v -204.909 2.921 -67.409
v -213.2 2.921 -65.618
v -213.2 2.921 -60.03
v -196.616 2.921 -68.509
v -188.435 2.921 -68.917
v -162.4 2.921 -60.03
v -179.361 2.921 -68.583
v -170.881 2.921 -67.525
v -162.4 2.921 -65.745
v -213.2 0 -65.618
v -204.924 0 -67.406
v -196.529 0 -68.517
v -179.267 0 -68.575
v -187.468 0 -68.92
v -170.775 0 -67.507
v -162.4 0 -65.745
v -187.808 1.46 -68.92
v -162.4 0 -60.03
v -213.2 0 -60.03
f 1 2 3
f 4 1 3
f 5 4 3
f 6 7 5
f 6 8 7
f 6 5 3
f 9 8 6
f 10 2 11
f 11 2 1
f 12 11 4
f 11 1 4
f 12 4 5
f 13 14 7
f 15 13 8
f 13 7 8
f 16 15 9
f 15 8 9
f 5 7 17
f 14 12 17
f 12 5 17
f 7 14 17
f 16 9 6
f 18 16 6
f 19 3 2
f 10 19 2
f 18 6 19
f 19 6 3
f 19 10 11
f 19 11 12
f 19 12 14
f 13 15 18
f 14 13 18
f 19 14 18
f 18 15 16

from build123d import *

# Parameters (mm, degrees)
SKETCH1_W           = 304.8
SKETCH1_H           = 76.2
BOSS_EXTRUDE1_DEPTH = 3.175
CUT_EXTRUDE3_DEPTH  = 0.254
CUT_EXTRUDE5_DEPTH  = 0.254
SKETCH3_2_OUTSIDE_W = 369.64
SKETCH3_2_OUTSIDE_H = 141.04
CUT_EXTRUDE8_DEPTH  = 315.196691105


with BuildPart() as part:
    # Sketch1 → Boss-Extrude1 (new body)
    with BuildSketch(Plane(origin=(0, 0, 0), x_dir=(1, 0, 0), z_dir=(0, 1, 0))):
        with Locations((-152.4, 38.1)):
            Rectangle(SKETCH1_W, SKETCH1_H)
    extrude(amount=BOSS_EXTRUDE1_DEPTH)

    # Sketch2 → Cut-Extrude3 (cut)
    with BuildSketch(Plane(origin=(0, 3.175, 0), x_dir=(1, 0, 0), z_dir=(0, 1, 0))):
        with BuildLine():
            Line((-304.8, 5.132354223), (-304.8, 0.390438323))
            add(Edge.make_bspline(
                [(-304.8, 0.390438323), (-303.821243343, 0.22923291), (-302.632591032, 0.100235841), (-301.136713645, 0)],
                knots=[0.767987957, 0.767987957, 0.767987957, 0.767987957, 1, 1, 1, 1], degree=3))
            Line((-301.136713645, 0), (-217.379871236, 0))
            add(Edge.make_bspline(
                [(-215.9, 0.210253502), (-216.602591478, 0.075926224), (-217.379871236, 0)],
                knots=[0.882956558, 0.882956558, 0.882956558, 1, 1, 1], degree=2))
            Line((-215.9, 0.210253502), (-215.9, 6.35))
            add(Edge.make_bspline(
                [(-304.8, 5.132354223), (-295.056068779, 7.913424716), (-284.63514545, 9.175759011), (-256.65451685, 7.910717471), (-231.983718042, 8.039058457), (-215.9, 6.35)],
                knots=[0.033341876, 0.033341876, 0.033341876, 0.033341876, 0.196819423, 0.285044024, 0.915587883, 0.915587883, 0.915587883, 0.915587883], degree=3))
        make_face()
        with BuildLine():
            Line((-304.748193138, 14.319973849), (-304.748193138, 9.578057948))
            add(Edge.make_bspline(
                [(-304.748193138, 9.578057948), (-303.76943648, 9.416852535), (-302.58078417, 9.287855466), (-301.084906782, 9.187619625)],
                knots=[0.767987957, 0.767987957, 0.767987957, 0.767987957, 1, 1, 1, 1], degree=3))
            Line((-301.084906782, 9.187619625), (-217.328064374, 9.187619625))
            add(Edge.make_bspline(
                [(-215.848193138, 9.397873128), (-216.550784616, 9.263545849), (-217.328064374, 9.187619625)],
                knots=[0.882956558, 0.882956558, 0.882956558, 1, 1, 1], degree=2))
            Line((-215.848193138, 9.397873128), (-215.848193138, 15.537619625))
            add(Edge.make_bspline(
                [(-304.748193138, 14.319973849), (-295.004261916, 17.101044341), (-284.583338588, 18.363378636), (-256.602709988, 17.098337097), (-231.93191118, 17.226678082), (-215.848193138, 15.537619625)],
                knots=[0.033341876, 0.033341876, 0.033341876, 0.033341876, 0.196819423, 0.285044024, 0.915587883, 0.915587883, 0.915587883, 0.915587883], degree=3))
        make_face()
        with BuildLine():
            Line((-304.77561062, 23.435546339), (-304.77561062, 18.693630439))
            add(Edge.make_bspline(
                [(-304.77561062, 18.693630439), (-303.796853962, 18.532425025), (-302.608201652, 18.403427957), (-301.112324264, 18.303192116)],
                knots=[0.767987957, 0.767987957, 0.767987957, 0.767987957, 1, 1, 1, 1], degree=3))
            Line((-301.112324264, 18.303192116), (-217.355481855, 18.303192116))
            add(Edge.make_bspline(
                [(-215.87561062, 18.513445618), (-216.578202097, 18.37911834), (-217.355481855, 18.303192116)],
                knots=[0.882956558, 0.882956558, 0.882956558, 1, 1, 1], degree=2))
            Line((-215.87561062, 18.513445618), (-215.87561062, 24.653192116))
            add(Edge.make_bspline(
                [(-304.77561062, 23.435546339), (-295.031679398, 26.216616832), (-284.61075607, 27.478951126), (-256.63012747, 26.213909587), (-231.959328661, 26.342250572), (-215.87561062, 24.653192116)],
                knots=[0.033341876, 0.033341876, 0.033341876, 0.033341876, 0.196819423, 0.285044024, 0.915587883, 0.915587883, 0.915587883, 0.915587883], degree=3))
        make_face()
        with BuildLine():
            Line((-304.723803757, 32.623165964), (-304.723803757, 27.881250064))
            add(Edge.make_bspline(
                [(-304.723803757, 27.881250064), (-303.7450471, 27.720044651), (-302.55639479, 27.591047582), (-301.060517402, 27.490811741)],
                knots=[0.767987957, 0.767987957, 0.767987957, 0.767987957, 1, 1, 1, 1], degree=3))
            Line((-301.060517402, 27.490811741), (-217.303674993, 27.490811741))
            add(Edge.make_bspline(
                [(-215.823803757, 27.701065244), (-216.526395235, 27.566737965), (-217.303674993, 27.490811741)],
                knots=[0.882956558, 0.882956558, 0.882956558, 1, 1, 1], degree=2))
            Line((-215.823803757, 27.701065244), (-215.823803757, 33.840811741))
            add(Edge.make_bspline(
                [(-304.723803757, 32.623165964), (-294.979872536, 35.404236457), (-284.558949208, 36.666570752), (-256.578320608, 35.401529213), (-231.907521799, 35.529870198), (-215.823803757, 33.840811741)],
                knots=[0.033341876, 0.033341876, 0.033341876, 0.033341876, 0.196819423, 0.285044024, 0.915587883, 0.915587883, 0.915587883, 0.915587883], degree=3))
        make_face()
        with BuildLine():
            Line((-304.692120731, 41.752034592), (-304.692120731, 37.010118692))
            add(Edge.make_bspline(
                [(-304.692120731, 37.010118692), (-303.713364073, 36.848913278), (-302.524711763, 36.71991621), (-301.028834375, 36.619680369)],
                knots=[0.767987957, 0.767987957, 0.767987957, 0.767987957, 1, 1, 1, 1], degree=3))
            Line((-301.028834375, 36.619680369), (-217.271991966, 36.619680369))
            add(Edge.make_bspline(
                [(-215.792120731, 36.829933871), (-216.494712209, 36.695606593), (-217.271991966, 36.619680369)],
                knots=[0.882956558, 0.882956558, 0.882956558, 1, 1, 1], degree=2))
            Line((-215.792120731, 36.829933871), (-215.792120731, 42.969680369))
            add(Edge.make_bspline(
                [(-304.692120731, 41.752034592), (-294.948189509, 44.533105085), (-284.527266181, 45.795439379), (-256.546637581, 44.53039784), (-231.875838773, 44.658738825), (-215.792120731, 42.969680369)],
                knots=[0.033341876, 0.033341876, 0.033341876, 0.033341876, 0.196819423, 0.285044024, 0.915587883, 0.915587883, 0.915587883, 0.915587883], degree=3))
        make_face()
        with BuildLine():
            Line((-304.640313869, 50.939654217), (-304.640313869, 46.197738317))
            add(Edge.make_bspline(
                [(-304.640313869, 46.197738317), (-303.661557211, 46.036532904), (-302.472904901, 45.907535835), (-300.977027513, 45.807299994)],
                knots=[0.767987957, 0.767987957, 0.767987957, 0.767987957, 1, 1, 1, 1], degree=3))
            Line((-300.977027513, 45.807299994), (-217.220185104, 45.807299994))
            add(Edge.make_bspline(
                [(-215.740313869, 46.017553497), (-216.442905346, 45.883226218), (-217.220185104, 45.807299994)],
                knots=[0.882956558, 0.882956558, 0.882956558, 1, 1, 1], degree=2))
            Line((-215.740313869, 46.017553497), (-215.740313869, 52.157299994))
            add(Edge.make_bspline(
                [(-304.640313869, 50.939654217), (-294.896382647, 53.72072471), (-284.475459319, 54.983059005), (-256.494830719, 53.718017466), (-231.82403191, 53.846358451), (-215.740313869, 52.157299994)],
                knots=[0.033341876, 0.033341876, 0.033341876, 0.033341876, 0.196819423, 0.285044024, 0.915587883, 0.915587883, 0.915587883, 0.915587883], degree=3))
        make_face()
        with BuildLine():
            Line((-304.66773135, 60.055226708), (-304.66773135, 55.313310807))
            add(Edge.make_bspline(
                [(-304.66773135, 55.313310807), (-303.688974693, 55.152105394), (-302.500322383, 55.023108326), (-301.004444995, 54.922872485)],
                knots=[0.767987957, 0.767987957, 0.767987957, 0.767987957, 1, 1, 1, 1], degree=3))
            Line((-301.004444995, 54.922872485), (-217.247602586, 54.922872485))
            add(Edge.make_bspline(
                [(-215.76773135, 55.133125987), (-216.470322828, 54.998798708), (-217.247602586, 54.922872485)],
                knots=[0.882956558, 0.882956558, 0.882956558, 1, 1, 1], degree=2))
            Line((-215.76773135, 55.133125987), (-215.76773135, 61.272872485))
            add(Edge.make_bspline(
                [(-304.66773135, 60.055226708), (-294.923800129, 62.836297201), (-284.502876801, 64.098631495), (-256.522248201, 62.833589956), (-231.851449392, 62.961930941), (-215.76773135, 61.272872485)],
                knots=[0.033341876, 0.033341876, 0.033341876, 0.033341876, 0.196819423, 0.285044024, 0.915587883, 0.915587883, 0.915587883, 0.915587883], degree=3))
        make_face()
        with BuildLine():
            Line((-304.615924488, 69.242846333), (-304.615924488, 64.500930433))
            add(Edge.make_bspline(
                [(-304.615924488, 64.500930433), (-303.637167831, 64.33972502), (-302.448515521, 64.210727951), (-300.952638133, 64.11049211)],
                knots=[0.767987957, 0.767987957, 0.767987957, 0.767987957, 1, 1, 1, 1], degree=3))
            Line((-300.952638133, 64.11049211), (-217.195795724, 64.11049211))
            add(Edge.make_bspline(
                [(-215.715924488, 64.320745612), (-216.418515966, 64.186418334), (-217.195795724, 64.11049211)],
                knots=[0.882956558, 0.882956558, 0.882956558, 1, 1, 1], degree=2))
            Line((-215.715924488, 64.320745612), (-215.715924488, 70.46049211))
            add(Edge.make_bspline(
                [(-304.615924488, 69.242846333), (-294.871993267, 72.023916826), (-284.451069938, 73.286251121), (-256.470441339, 72.021209581), (-231.79964253, 72.149550567), (-215.715924488, 70.46049211)],
                knots=[0.033341876, 0.033341876, 0.033341876, 0.033341876, 0.196819423, 0.285044024, 0.915587883, 0.915587883, 0.915587883, 0.915587883], degree=3))
        make_face()
        with BuildLine():
            Line((-215.183865707, 5.315478387), (-215.183865707, 0.573562486))
            add(Edge.make_bspline(
                [(-215.183865707, 0.573562486), (-214.20510905, 0.412357073), (-213.01645674, 0.283360005), (-211.520579352, 0.183124164)],
                knots=[0.767987957, 0.767987957, 0.767987957, 0.767987957, 1, 1, 1, 1], degree=3))
            Line((-211.520579352, 0.183124164), (-127.763736943, 0.183124164))
            add(Edge.make_bspline(
                [(-126.283865707, 0.393377666), (-126.986457185, 0.259050387), (-127.763736943, 0.183124164)],
                knots=[0.882956558, 0.882956558, 0.882956558, 1, 1, 1], degree=2))
            Line((-126.283865707, 0.393377666), (-126.283865707, 6.533124164))
            add(Edge.make_bspline(
                [(-215.183865707, 5.315478387), (-205.439934486, 8.09654888), (-195.019011157, 9.358883174), (-167.038382558, 8.093841635), (-142.367583749, 8.22218262), (-126.283865707, 6.533124164)],
                knots=[0.033341876, 0.033341876, 0.033341876, 0.033341876, 0.196819423, 0.285044024, 0.915587883, 0.915587883, 0.915587883, 0.915587883], degree=3))
        make_face()
        with BuildLine():
            Line((-215.132058845, 14.503098012), (-215.132058845, 9.761182112))
            add(Edge.make_bspline(
                [(-215.132058845, 9.761182112), (-214.153302188, 9.599976698), (-212.964649877, 9.47097963), (-211.46877249, 9.370743789)],
                knots=[0.767987957, 0.767987957, 0.767987957, 0.767987957, 1, 1, 1, 1], degree=3))
            Line((-211.46877249, 9.370743789), (-127.711930081, 9.370743789))
            add(Edge.make_bspline(
                [(-126.232058845, 9.580997291), (-126.934650323, 9.446670013), (-127.711930081, 9.370743789)],
                knots=[0.882956558, 0.882956558, 0.882956558, 1, 1, 1], degree=2))
            Line((-126.232058845, 9.580997291), (-126.232058845, 15.720743789))
            add(Edge.make_bspline(
                [(-215.132058845, 14.503098012), (-205.388127624, 17.284168505), (-194.967204295, 18.546502799), (-166.986575695, 17.28146126), (-142.315776887, 17.409802246), (-126.232058845, 15.720743789)],
                knots=[0.033341876, 0.033341876, 0.033341876, 0.033341876, 0.196819423, 0.285044024, 0.915587883, 0.915587883, 0.915587883, 0.915587883], degree=3))
        make_face()
        with BuildLine():
            Line((-215.159476327, 23.618670503), (-215.159476327, 18.876754602))
            add(Edge.make_bspline(
                [(-215.159476327, 18.876754602), (-214.180719669, 18.715549189), (-212.992067359, 18.58655212), (-211.496189971, 18.486316279)],
                knots=[0.767987957, 0.767987957, 0.767987957, 0.767987957, 1, 1, 1, 1], degree=3))
            Line((-211.496189971, 18.486316279), (-127.739347562, 18.486316279))
            add(Edge.make_bspline(
                [(-126.259476327, 18.696569782), (-126.962067804, 18.562242503), (-127.739347562, 18.486316279)],
                knots=[0.882956558, 0.882956558, 0.882956558, 1, 1, 1], degree=2))
            Line((-126.259476327, 18.696569782), (-126.259476327, 24.836316279))
            add(Edge.make_bspline(
                [(-215.159476327, 23.618670503), (-205.415545105, 26.399740996), (-194.994621777, 27.66207529), (-167.013993177, 26.397033751), (-142.343194369, 26.525374736), (-126.259476327, 24.836316279)],
                knots=[0.033341876, 0.033341876, 0.033341876, 0.033341876, 0.196819423, 0.285044024, 0.915587883, 0.915587883, 0.915587883, 0.915587883], degree=3))
        make_face()
        with BuildLine():
            Line((-215.107669465, 32.806290128), (-215.107669465, 28.064374228))
            add(Edge.make_bspline(
                [(-215.107669465, 28.064374228), (-214.128912807, 27.903168814), (-212.940260497, 27.774171746), (-211.444383109, 27.673935905)],
                knots=[0.767987957, 0.767987957, 0.767987957, 0.767987957, 1, 1, 1, 1], degree=3))
            Line((-211.444383109, 27.673935905), (-127.6875407, 27.673935905))
            add(Edge.make_bspline(
                [(-126.207669465, 27.884189407), (-126.910260942, 27.749862129), (-127.6875407, 27.673935905)],
                knots=[0.882956558, 0.882956558, 0.882956558, 1, 1, 1], degree=2))
            Line((-126.207669465, 27.884189407), (-126.207669465, 34.023935905))
            add(Edge.make_bspline(
                [(-215.107669465, 32.806290128), (-205.363738243, 35.587360621), (-194.942814915, 36.849694915), (-166.962186315, 35.584653376), (-142.291387506, 35.712994361), (-126.207669465, 34.023935905)],
                knots=[0.033341876, 0.033341876, 0.033341876, 0.033341876, 0.196819423, 0.285044024, 0.915587883, 0.915587883, 0.915587883, 0.915587883], degree=3))
        make_face()
    extrude(amount=-CUT_EXTRUDE3_DEPTH, mode=Mode.SUBTRACT)

    # Sketch3 → Cut-Extrude5 (cut)
    with BuildSketch(Plane(origin=(0, 3.175, 0), x_dir=(1, 0, 0), z_dir=(0, 1, 0))):
        with BuildLine():
            Line((-124.773731724, 0), (-73.973731724, 0))
            Line((-73.973731724, 0), (-73.973731724, 5.715))
            add(Edge.make_bspline(
                [(-124.773731724, 5.588), (-99.390849234, 12.627627449), (-73.973731724, 5.715)],
                knots=[0, 0, 0, 1, 1, 1], degree=2))
            Line((-124.773731724, 5.588), (-124.773731724, 0))
        make_face()
        with BuildLine():
            Line((-124.666073477, 9.555243731), (-73.866073477, 9.555243731))
            Line((-73.866073477, 9.555243731), (-73.866073477, 15.270243731))
            add(Edge.make_bspline(
                [(-124.666073477, 15.143243731), (-99.282006864, 21.683704535), (-73.866073477, 15.270243731)],
                knots=[0, 0, 0, 1, 1, 1], degree=2))
            Line((-124.666073477, 15.143243731), (-124.666073477, 9.555243731))
        make_face()
        with BuildLine():
            Line((-124.604715686, 19.129476511), (-73.804715686, 19.129476511))
            Line((-73.804715686, 19.129476511), (-73.804715686, 24.844476511))
            add(Edge.make_bspline(
                [(-124.604715686, 24.717476511), (-99.220649073, 31.257937315), (-73.804715686, 24.844476511)],
                knots=[0, 0, 0, 1, 1, 1], degree=2))
            Line((-124.604715686, 24.717476511), (-124.604715686, 19.129476511))
        make_face()
        with BuildLine():
            Line((-124.495240807, 28.763265862), (-73.695240807, 28.763265862))
            Line((-73.695240807, 28.763265862), (-73.695240807, 34.478265862))
            add(Edge.make_bspline(
                [(-124.495240807, 34.351265862), (-99.111174194, 40.891726665), (-73.695240807, 34.478265862)],
                knots=[0, 0, 0, 1, 1, 1], degree=2))
            Line((-124.495240807, 34.351265862), (-124.495240807, 28.763265862))
        make_face()
        with BuildLine():
            Line((-124.385765928, 38.397055212), (-73.585765928, 38.397055212))
            Line((-73.585765928, 38.397055212), (-73.585765928, 44.112055212))
            add(Edge.make_bspline(
                [(-124.385765928, 43.985055212), (-99.001699315, 50.525516016), (-73.585765928, 44.112055212)],
                knots=[0, 0, 0, 1, 1, 1], degree=2))
            Line((-124.385765928, 43.985055212), (-124.385765928, 38.397055212))
        make_face()
        with BuildLine():
            Line((-124.166816171, 49.235068231), (-73.366816171, 49.235068231))
            Line((-73.366816171, 49.235068231), (-73.366816171, 54.950068231))
            add(Edge.make_bspline(
                [(-124.166816171, 54.823068231), (-98.782749557, 61.363529035), (-73.366816171, 54.950068231)],
                knots=[0, 0, 0, 1, 1, 1], degree=2))
            Line((-124.166816171, 54.823068231), (-124.166816171, 49.235068231))
        make_face()
        with BuildLine():
            Line((-124.138868232, 59.013713621), (-73.338868232, 59.013713621))
            Line((-73.338868232, 59.013713621), (-73.338868232, 64.728713621))
            add(Edge.make_bspline(
                [(-124.138868232, 64.601713621), (-98.754801619, 71.142174425), (-73.338868232, 64.728713621)],
                knots=[0, 0, 0, 1, 1, 1], degree=2))
            Line((-124.138868232, 64.601713621), (-124.138868232, 59.013713621))
        make_face()
        with BuildLine():
            Line((-213.669393762, 38.449060159), (-162.869393762, 38.449060159))
            Line((-162.869393762, 38.449060159), (-162.869393762, 44.164060159))
            add(Edge.make_bspline(
                [(-213.669393762, 44.037060159), (-188.285327148, 50.577520962), (-162.869393762, 44.164060159)],
                knots=[0, 0, 0, 1, 1, 1], degree=2))
            Line((-213.669393762, 44.037060159), (-213.669393762, 38.449060159))
        make_face()
        with BuildLine():
            Line((-213.513008565, 49.239638781), (-162.713008565, 49.239638781))
            Line((-162.713008565, 49.239638781), (-162.713008565, 54.954638781))
            add(Edge.make_bspline(
                [(-213.513008565, 54.827638781), (-188.128941951, 61.368099585), (-162.713008565, 54.954638781)],
                knots=[0, 0, 0, 1, 1, 1], degree=2))
            Line((-213.513008565, 54.827638781), (-213.513008565, 49.239638781))
        make_face()
        with BuildLine():
            Line((-213.20023817, 60.030217404), (-162.40023817, 60.030217404))
            Line((-162.40023817, 60.030217404), (-162.40023817, 65.745217404))
            add(Edge.make_bspline(
                [(-213.20023817, 65.618217404), (-187.816171556, 72.158678208), (-162.40023817, 65.745217404)],
                knots=[0, 0, 0, 1, 1, 1], degree=2))
            Line((-213.20023817, 65.618217404), (-213.20023817, 60.030217404))
        make_face()
        Polygon((0, 76.2), (-31.75, 76.2), (-63.5, 0), (0, 0), align=None)
    extrude(amount=-CUT_EXTRUDE5_DEPTH, mode=Mode.SUBTRACT)

    # Sketch3<2> outside → Cut-Extrude8 (cut, through all)
    with BuildSketch(Plane(origin=(0, 3.175, 0), x_dir=(1, 0, 0), z_dir=(0, 1, 0))):
        with Locations((-152.4, 38.1)):
            Rectangle(SKETCH3_2_OUTSIDE_W, SKETCH3_2_OUTSIDE_H)
        with BuildLine():
            Line((-213.20023817, 65.618217404), (-213.20023817, 60.030217404))
            Line((-213.20023817, 60.030217404), (-162.40023817, 60.030217404))
            Line((-162.40023817, 60.030217404), (-162.40023817, 65.745217404))
            add(Edge.make_bspline(
                [(-213.20023817, 65.618217404), (-187.816171556, 72.158678208), (-162.40023817, 65.745217404)],
                knots=[0, 0, 0, 1, 1, 1], degree=2))
        make_face(mode=Mode.SUBTRACT)
    extrude(amount=-CUT_EXTRUDE8_DEPTH, mode=Mode.SUBTRACT)


solid = part.part
